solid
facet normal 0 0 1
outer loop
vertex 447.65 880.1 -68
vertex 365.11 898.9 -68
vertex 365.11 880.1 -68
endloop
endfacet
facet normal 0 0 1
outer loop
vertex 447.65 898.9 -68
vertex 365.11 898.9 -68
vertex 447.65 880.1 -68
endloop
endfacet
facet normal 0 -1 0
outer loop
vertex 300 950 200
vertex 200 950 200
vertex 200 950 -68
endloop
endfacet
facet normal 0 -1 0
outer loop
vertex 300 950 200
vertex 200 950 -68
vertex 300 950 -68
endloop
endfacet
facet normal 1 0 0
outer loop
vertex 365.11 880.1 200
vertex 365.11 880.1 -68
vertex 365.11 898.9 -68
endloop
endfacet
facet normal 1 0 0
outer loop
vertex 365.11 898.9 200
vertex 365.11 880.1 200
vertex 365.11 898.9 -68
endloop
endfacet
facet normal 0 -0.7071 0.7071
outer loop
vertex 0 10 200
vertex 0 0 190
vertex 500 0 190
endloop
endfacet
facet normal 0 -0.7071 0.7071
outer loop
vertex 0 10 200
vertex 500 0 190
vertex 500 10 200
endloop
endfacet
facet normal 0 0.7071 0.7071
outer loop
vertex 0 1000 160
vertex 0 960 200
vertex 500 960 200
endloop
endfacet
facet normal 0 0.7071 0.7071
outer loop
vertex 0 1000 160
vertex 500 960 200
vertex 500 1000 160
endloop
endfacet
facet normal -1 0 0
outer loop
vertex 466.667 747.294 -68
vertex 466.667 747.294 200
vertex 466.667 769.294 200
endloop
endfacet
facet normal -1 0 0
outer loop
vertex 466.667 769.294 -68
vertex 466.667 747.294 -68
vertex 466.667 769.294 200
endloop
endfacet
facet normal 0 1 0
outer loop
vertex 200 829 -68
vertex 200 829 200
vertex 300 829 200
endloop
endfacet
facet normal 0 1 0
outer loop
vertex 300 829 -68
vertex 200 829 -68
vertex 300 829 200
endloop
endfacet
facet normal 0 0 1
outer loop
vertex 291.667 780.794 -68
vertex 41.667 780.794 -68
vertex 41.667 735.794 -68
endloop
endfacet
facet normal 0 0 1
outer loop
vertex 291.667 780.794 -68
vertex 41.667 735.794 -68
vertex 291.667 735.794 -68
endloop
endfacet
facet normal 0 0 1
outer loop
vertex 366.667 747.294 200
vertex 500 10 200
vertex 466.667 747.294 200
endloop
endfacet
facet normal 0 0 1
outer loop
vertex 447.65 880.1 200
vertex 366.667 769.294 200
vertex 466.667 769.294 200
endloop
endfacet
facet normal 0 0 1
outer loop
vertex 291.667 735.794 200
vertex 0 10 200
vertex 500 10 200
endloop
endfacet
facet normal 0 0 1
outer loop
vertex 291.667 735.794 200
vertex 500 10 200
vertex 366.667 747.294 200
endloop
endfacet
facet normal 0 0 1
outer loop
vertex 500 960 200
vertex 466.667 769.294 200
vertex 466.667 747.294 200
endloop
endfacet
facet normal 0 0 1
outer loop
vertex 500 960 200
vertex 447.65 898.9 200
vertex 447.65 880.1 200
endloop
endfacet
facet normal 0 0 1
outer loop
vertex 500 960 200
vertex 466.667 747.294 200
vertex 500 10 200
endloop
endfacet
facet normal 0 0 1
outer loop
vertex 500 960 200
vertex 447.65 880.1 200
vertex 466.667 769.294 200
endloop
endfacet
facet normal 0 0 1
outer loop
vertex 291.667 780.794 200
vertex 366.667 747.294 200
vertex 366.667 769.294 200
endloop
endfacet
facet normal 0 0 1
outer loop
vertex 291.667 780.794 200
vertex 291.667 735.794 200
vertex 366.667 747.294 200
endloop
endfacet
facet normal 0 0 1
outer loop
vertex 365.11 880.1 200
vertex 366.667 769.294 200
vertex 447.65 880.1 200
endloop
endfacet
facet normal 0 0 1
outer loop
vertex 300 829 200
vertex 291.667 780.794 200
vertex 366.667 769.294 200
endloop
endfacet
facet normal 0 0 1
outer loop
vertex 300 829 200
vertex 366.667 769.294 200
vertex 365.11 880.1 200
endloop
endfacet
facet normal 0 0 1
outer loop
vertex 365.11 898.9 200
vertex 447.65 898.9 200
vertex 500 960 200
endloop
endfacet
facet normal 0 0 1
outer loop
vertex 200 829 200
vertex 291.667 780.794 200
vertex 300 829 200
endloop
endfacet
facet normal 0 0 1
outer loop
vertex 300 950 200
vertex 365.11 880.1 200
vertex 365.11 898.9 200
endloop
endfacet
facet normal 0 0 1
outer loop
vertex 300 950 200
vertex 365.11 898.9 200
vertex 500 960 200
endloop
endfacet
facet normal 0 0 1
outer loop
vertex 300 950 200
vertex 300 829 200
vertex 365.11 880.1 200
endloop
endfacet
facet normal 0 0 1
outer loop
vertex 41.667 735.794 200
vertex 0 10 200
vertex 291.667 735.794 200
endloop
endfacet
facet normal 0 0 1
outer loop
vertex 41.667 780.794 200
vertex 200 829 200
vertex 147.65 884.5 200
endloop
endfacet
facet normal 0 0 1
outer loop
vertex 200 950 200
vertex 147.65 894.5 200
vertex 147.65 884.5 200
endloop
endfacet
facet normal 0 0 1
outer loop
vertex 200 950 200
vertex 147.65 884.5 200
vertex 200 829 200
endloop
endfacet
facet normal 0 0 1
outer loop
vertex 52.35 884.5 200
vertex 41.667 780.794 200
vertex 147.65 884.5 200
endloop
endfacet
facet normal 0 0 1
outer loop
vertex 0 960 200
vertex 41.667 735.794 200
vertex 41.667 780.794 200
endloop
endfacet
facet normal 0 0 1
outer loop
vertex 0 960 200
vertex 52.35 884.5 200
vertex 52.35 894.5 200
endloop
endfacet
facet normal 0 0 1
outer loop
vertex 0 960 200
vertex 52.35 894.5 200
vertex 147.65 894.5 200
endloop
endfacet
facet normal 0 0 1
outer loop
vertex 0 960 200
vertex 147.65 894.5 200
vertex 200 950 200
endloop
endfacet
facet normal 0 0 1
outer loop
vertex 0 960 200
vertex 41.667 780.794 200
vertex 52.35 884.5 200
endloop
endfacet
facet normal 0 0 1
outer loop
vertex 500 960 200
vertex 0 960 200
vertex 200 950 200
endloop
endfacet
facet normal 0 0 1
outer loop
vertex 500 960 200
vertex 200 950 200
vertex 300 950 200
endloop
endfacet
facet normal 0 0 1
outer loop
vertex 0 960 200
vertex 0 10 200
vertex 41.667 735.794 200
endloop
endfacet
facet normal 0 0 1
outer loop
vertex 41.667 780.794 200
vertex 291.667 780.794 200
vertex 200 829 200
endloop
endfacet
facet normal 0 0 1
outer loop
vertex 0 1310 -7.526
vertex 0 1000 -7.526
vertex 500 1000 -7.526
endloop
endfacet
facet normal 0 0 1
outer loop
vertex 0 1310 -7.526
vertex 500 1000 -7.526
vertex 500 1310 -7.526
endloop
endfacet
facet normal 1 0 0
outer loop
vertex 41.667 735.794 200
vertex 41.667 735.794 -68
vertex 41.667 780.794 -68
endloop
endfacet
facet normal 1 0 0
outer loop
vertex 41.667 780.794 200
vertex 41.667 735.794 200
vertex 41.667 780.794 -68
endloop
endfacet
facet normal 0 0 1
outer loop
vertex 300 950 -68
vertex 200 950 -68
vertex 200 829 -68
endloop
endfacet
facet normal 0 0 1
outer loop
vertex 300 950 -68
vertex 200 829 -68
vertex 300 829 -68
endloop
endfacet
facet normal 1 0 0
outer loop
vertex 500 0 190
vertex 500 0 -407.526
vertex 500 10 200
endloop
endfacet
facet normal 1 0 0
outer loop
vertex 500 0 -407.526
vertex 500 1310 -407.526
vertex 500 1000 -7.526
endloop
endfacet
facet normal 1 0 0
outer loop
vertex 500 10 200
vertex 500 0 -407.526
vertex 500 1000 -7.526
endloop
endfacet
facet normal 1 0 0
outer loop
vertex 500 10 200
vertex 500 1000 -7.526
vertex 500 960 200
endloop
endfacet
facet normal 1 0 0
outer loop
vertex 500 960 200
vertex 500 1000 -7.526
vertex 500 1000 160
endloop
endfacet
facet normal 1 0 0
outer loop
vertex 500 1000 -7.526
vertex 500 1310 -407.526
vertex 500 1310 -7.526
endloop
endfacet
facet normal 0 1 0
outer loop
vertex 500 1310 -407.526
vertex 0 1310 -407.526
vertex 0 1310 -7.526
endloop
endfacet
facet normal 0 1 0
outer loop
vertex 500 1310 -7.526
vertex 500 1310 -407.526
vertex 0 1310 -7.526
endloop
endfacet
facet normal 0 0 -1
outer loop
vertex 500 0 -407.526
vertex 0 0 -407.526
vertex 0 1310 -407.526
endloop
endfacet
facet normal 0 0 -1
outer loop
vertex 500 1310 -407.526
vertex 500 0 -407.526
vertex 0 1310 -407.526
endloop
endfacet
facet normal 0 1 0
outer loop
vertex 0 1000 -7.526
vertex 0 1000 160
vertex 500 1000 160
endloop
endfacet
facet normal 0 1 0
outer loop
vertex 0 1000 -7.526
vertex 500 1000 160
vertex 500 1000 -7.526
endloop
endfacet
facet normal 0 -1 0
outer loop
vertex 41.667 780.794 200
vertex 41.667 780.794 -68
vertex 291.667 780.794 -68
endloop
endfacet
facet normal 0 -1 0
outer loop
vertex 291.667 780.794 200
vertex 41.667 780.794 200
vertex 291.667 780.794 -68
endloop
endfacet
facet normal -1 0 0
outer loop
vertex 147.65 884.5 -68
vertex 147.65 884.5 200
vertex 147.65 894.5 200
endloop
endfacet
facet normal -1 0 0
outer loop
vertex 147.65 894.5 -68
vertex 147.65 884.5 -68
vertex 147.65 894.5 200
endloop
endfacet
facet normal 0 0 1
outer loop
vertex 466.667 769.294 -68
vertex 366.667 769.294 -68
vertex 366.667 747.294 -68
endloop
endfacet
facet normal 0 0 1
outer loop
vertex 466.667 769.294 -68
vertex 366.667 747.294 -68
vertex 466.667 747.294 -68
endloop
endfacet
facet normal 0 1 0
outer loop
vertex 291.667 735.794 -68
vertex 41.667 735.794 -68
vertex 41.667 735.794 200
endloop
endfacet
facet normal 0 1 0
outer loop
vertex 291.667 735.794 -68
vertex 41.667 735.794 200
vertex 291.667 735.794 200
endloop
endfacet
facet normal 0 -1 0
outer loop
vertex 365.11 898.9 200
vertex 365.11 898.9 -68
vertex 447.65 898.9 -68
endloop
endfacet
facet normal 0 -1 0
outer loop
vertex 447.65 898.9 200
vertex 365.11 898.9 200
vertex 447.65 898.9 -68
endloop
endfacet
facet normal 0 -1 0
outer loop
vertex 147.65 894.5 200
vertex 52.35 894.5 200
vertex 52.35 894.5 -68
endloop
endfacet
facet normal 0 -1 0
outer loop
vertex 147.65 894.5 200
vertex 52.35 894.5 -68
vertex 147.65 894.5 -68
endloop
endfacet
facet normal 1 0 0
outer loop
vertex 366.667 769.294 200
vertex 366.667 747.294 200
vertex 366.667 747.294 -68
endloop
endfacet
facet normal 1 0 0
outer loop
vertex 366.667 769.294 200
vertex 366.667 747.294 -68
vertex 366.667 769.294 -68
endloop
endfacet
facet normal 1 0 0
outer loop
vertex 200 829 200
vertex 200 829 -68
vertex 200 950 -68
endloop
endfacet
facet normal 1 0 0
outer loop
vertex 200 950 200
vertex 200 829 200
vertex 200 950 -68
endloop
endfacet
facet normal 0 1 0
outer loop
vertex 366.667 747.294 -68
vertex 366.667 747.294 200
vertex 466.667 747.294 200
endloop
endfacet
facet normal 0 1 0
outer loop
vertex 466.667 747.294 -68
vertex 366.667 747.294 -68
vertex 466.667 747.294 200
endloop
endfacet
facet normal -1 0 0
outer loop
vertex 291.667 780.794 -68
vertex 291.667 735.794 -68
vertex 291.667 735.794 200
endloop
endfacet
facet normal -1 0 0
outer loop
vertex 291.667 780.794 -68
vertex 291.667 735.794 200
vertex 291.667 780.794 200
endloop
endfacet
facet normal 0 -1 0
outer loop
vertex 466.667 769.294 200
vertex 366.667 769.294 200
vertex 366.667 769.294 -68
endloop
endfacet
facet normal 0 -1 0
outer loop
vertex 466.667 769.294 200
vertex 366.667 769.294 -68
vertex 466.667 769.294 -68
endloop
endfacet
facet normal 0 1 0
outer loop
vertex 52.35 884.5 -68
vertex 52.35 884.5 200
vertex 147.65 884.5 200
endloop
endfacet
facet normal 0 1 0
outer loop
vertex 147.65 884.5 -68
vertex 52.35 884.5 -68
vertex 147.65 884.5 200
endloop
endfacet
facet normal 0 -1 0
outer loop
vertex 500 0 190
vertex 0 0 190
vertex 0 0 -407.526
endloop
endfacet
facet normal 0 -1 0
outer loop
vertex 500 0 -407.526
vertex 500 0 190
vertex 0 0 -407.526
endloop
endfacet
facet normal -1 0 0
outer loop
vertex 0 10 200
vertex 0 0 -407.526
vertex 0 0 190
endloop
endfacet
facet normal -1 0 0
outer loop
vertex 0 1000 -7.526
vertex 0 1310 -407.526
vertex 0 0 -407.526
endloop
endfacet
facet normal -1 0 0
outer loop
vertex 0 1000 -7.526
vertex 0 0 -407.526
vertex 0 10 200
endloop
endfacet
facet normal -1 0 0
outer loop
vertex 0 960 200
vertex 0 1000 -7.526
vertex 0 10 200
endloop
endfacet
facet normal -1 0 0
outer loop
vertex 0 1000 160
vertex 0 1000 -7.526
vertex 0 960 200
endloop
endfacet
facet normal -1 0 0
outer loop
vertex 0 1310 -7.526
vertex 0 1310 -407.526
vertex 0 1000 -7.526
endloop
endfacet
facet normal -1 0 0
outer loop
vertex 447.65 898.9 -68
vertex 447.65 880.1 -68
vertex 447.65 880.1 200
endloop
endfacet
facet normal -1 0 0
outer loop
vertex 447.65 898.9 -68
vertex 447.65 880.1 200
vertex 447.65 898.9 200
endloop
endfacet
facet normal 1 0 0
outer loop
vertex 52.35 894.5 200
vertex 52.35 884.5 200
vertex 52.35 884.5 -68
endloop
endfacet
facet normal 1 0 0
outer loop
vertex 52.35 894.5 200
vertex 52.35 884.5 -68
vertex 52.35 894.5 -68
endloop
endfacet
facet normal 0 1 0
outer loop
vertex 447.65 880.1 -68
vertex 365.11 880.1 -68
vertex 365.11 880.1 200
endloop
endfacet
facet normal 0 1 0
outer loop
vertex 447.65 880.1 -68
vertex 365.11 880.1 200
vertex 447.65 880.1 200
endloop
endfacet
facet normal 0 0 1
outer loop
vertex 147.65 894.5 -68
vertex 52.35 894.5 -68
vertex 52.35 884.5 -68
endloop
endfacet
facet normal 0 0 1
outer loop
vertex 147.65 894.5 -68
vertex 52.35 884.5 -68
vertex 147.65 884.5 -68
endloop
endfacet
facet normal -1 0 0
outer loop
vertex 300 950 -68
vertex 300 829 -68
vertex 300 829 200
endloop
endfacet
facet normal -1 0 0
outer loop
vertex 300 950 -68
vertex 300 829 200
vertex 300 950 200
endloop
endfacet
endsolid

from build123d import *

# Parameters (mm, degrees)
BOSS_EXTRUDE1_DEPTH = 500
SKETCH2_W           = 100
SKETCH2_H           = 121
SKETCH2_W_2         = 95.3
SKETCH2_H_2         = 10
SKETCH2_W_3         = 82.54
SKETCH2_H_3         = 18.8
SKETCH2_H_4         = 22
SKETCH2_W_4         = 250
SKETCH2_H_5         = 45
CUT_EXTRUDE1_DEPTH  = 268


with BuildPart() as part:
    # Sketch1 → Boss-Extrude1 (new body)
    with BuildSketch(Plane(origin=(0, 0, 0), x_dir=(0, 0, -1), z_dir=(1, 0, 0))):
        Polygon((0, 0), (-190, 0), (-200, 10), (-200, 960), (-160, 1000), (7.526077778, 1000), (7.526077778, 1310), (57.526077778, 1310), (407.526077778, 1310), (407.526077778, 1000), (407.526077778, 970), (407.526077778, 820), (407.526077778, 0), align=None)
    extrude(amount=BOSS_EXTRUDE1_DEPTH)

    # Sketch2 → Cut-Extrude1 (cut)
    with BuildSketch(Plane.XY.offset(200)):
        with Locations((250, 889.5)):
            Rectangle(SKETCH2_W, SKETCH2_H)
        with Locations((100, 889.5)):
            Rectangle(SKETCH2_W_2, SKETCH2_H_2)
        with Locations((406.38, 889.5)):
            Rectangle(SKETCH2_W_3, SKETCH2_H_3)
        with Locations((416.666666667, 758.294000626)):
            Rectangle(SKETCH2_W, SKETCH2_H_4)
        with Locations((166.666666667, 758.294000626)):
            Rectangle(SKETCH2_W_4, SKETCH2_H_5)
    extrude(amount=-CUT_EXTRUDE1_DEPTH, mode=Mode.SUBTRACT)


solid = part.part
